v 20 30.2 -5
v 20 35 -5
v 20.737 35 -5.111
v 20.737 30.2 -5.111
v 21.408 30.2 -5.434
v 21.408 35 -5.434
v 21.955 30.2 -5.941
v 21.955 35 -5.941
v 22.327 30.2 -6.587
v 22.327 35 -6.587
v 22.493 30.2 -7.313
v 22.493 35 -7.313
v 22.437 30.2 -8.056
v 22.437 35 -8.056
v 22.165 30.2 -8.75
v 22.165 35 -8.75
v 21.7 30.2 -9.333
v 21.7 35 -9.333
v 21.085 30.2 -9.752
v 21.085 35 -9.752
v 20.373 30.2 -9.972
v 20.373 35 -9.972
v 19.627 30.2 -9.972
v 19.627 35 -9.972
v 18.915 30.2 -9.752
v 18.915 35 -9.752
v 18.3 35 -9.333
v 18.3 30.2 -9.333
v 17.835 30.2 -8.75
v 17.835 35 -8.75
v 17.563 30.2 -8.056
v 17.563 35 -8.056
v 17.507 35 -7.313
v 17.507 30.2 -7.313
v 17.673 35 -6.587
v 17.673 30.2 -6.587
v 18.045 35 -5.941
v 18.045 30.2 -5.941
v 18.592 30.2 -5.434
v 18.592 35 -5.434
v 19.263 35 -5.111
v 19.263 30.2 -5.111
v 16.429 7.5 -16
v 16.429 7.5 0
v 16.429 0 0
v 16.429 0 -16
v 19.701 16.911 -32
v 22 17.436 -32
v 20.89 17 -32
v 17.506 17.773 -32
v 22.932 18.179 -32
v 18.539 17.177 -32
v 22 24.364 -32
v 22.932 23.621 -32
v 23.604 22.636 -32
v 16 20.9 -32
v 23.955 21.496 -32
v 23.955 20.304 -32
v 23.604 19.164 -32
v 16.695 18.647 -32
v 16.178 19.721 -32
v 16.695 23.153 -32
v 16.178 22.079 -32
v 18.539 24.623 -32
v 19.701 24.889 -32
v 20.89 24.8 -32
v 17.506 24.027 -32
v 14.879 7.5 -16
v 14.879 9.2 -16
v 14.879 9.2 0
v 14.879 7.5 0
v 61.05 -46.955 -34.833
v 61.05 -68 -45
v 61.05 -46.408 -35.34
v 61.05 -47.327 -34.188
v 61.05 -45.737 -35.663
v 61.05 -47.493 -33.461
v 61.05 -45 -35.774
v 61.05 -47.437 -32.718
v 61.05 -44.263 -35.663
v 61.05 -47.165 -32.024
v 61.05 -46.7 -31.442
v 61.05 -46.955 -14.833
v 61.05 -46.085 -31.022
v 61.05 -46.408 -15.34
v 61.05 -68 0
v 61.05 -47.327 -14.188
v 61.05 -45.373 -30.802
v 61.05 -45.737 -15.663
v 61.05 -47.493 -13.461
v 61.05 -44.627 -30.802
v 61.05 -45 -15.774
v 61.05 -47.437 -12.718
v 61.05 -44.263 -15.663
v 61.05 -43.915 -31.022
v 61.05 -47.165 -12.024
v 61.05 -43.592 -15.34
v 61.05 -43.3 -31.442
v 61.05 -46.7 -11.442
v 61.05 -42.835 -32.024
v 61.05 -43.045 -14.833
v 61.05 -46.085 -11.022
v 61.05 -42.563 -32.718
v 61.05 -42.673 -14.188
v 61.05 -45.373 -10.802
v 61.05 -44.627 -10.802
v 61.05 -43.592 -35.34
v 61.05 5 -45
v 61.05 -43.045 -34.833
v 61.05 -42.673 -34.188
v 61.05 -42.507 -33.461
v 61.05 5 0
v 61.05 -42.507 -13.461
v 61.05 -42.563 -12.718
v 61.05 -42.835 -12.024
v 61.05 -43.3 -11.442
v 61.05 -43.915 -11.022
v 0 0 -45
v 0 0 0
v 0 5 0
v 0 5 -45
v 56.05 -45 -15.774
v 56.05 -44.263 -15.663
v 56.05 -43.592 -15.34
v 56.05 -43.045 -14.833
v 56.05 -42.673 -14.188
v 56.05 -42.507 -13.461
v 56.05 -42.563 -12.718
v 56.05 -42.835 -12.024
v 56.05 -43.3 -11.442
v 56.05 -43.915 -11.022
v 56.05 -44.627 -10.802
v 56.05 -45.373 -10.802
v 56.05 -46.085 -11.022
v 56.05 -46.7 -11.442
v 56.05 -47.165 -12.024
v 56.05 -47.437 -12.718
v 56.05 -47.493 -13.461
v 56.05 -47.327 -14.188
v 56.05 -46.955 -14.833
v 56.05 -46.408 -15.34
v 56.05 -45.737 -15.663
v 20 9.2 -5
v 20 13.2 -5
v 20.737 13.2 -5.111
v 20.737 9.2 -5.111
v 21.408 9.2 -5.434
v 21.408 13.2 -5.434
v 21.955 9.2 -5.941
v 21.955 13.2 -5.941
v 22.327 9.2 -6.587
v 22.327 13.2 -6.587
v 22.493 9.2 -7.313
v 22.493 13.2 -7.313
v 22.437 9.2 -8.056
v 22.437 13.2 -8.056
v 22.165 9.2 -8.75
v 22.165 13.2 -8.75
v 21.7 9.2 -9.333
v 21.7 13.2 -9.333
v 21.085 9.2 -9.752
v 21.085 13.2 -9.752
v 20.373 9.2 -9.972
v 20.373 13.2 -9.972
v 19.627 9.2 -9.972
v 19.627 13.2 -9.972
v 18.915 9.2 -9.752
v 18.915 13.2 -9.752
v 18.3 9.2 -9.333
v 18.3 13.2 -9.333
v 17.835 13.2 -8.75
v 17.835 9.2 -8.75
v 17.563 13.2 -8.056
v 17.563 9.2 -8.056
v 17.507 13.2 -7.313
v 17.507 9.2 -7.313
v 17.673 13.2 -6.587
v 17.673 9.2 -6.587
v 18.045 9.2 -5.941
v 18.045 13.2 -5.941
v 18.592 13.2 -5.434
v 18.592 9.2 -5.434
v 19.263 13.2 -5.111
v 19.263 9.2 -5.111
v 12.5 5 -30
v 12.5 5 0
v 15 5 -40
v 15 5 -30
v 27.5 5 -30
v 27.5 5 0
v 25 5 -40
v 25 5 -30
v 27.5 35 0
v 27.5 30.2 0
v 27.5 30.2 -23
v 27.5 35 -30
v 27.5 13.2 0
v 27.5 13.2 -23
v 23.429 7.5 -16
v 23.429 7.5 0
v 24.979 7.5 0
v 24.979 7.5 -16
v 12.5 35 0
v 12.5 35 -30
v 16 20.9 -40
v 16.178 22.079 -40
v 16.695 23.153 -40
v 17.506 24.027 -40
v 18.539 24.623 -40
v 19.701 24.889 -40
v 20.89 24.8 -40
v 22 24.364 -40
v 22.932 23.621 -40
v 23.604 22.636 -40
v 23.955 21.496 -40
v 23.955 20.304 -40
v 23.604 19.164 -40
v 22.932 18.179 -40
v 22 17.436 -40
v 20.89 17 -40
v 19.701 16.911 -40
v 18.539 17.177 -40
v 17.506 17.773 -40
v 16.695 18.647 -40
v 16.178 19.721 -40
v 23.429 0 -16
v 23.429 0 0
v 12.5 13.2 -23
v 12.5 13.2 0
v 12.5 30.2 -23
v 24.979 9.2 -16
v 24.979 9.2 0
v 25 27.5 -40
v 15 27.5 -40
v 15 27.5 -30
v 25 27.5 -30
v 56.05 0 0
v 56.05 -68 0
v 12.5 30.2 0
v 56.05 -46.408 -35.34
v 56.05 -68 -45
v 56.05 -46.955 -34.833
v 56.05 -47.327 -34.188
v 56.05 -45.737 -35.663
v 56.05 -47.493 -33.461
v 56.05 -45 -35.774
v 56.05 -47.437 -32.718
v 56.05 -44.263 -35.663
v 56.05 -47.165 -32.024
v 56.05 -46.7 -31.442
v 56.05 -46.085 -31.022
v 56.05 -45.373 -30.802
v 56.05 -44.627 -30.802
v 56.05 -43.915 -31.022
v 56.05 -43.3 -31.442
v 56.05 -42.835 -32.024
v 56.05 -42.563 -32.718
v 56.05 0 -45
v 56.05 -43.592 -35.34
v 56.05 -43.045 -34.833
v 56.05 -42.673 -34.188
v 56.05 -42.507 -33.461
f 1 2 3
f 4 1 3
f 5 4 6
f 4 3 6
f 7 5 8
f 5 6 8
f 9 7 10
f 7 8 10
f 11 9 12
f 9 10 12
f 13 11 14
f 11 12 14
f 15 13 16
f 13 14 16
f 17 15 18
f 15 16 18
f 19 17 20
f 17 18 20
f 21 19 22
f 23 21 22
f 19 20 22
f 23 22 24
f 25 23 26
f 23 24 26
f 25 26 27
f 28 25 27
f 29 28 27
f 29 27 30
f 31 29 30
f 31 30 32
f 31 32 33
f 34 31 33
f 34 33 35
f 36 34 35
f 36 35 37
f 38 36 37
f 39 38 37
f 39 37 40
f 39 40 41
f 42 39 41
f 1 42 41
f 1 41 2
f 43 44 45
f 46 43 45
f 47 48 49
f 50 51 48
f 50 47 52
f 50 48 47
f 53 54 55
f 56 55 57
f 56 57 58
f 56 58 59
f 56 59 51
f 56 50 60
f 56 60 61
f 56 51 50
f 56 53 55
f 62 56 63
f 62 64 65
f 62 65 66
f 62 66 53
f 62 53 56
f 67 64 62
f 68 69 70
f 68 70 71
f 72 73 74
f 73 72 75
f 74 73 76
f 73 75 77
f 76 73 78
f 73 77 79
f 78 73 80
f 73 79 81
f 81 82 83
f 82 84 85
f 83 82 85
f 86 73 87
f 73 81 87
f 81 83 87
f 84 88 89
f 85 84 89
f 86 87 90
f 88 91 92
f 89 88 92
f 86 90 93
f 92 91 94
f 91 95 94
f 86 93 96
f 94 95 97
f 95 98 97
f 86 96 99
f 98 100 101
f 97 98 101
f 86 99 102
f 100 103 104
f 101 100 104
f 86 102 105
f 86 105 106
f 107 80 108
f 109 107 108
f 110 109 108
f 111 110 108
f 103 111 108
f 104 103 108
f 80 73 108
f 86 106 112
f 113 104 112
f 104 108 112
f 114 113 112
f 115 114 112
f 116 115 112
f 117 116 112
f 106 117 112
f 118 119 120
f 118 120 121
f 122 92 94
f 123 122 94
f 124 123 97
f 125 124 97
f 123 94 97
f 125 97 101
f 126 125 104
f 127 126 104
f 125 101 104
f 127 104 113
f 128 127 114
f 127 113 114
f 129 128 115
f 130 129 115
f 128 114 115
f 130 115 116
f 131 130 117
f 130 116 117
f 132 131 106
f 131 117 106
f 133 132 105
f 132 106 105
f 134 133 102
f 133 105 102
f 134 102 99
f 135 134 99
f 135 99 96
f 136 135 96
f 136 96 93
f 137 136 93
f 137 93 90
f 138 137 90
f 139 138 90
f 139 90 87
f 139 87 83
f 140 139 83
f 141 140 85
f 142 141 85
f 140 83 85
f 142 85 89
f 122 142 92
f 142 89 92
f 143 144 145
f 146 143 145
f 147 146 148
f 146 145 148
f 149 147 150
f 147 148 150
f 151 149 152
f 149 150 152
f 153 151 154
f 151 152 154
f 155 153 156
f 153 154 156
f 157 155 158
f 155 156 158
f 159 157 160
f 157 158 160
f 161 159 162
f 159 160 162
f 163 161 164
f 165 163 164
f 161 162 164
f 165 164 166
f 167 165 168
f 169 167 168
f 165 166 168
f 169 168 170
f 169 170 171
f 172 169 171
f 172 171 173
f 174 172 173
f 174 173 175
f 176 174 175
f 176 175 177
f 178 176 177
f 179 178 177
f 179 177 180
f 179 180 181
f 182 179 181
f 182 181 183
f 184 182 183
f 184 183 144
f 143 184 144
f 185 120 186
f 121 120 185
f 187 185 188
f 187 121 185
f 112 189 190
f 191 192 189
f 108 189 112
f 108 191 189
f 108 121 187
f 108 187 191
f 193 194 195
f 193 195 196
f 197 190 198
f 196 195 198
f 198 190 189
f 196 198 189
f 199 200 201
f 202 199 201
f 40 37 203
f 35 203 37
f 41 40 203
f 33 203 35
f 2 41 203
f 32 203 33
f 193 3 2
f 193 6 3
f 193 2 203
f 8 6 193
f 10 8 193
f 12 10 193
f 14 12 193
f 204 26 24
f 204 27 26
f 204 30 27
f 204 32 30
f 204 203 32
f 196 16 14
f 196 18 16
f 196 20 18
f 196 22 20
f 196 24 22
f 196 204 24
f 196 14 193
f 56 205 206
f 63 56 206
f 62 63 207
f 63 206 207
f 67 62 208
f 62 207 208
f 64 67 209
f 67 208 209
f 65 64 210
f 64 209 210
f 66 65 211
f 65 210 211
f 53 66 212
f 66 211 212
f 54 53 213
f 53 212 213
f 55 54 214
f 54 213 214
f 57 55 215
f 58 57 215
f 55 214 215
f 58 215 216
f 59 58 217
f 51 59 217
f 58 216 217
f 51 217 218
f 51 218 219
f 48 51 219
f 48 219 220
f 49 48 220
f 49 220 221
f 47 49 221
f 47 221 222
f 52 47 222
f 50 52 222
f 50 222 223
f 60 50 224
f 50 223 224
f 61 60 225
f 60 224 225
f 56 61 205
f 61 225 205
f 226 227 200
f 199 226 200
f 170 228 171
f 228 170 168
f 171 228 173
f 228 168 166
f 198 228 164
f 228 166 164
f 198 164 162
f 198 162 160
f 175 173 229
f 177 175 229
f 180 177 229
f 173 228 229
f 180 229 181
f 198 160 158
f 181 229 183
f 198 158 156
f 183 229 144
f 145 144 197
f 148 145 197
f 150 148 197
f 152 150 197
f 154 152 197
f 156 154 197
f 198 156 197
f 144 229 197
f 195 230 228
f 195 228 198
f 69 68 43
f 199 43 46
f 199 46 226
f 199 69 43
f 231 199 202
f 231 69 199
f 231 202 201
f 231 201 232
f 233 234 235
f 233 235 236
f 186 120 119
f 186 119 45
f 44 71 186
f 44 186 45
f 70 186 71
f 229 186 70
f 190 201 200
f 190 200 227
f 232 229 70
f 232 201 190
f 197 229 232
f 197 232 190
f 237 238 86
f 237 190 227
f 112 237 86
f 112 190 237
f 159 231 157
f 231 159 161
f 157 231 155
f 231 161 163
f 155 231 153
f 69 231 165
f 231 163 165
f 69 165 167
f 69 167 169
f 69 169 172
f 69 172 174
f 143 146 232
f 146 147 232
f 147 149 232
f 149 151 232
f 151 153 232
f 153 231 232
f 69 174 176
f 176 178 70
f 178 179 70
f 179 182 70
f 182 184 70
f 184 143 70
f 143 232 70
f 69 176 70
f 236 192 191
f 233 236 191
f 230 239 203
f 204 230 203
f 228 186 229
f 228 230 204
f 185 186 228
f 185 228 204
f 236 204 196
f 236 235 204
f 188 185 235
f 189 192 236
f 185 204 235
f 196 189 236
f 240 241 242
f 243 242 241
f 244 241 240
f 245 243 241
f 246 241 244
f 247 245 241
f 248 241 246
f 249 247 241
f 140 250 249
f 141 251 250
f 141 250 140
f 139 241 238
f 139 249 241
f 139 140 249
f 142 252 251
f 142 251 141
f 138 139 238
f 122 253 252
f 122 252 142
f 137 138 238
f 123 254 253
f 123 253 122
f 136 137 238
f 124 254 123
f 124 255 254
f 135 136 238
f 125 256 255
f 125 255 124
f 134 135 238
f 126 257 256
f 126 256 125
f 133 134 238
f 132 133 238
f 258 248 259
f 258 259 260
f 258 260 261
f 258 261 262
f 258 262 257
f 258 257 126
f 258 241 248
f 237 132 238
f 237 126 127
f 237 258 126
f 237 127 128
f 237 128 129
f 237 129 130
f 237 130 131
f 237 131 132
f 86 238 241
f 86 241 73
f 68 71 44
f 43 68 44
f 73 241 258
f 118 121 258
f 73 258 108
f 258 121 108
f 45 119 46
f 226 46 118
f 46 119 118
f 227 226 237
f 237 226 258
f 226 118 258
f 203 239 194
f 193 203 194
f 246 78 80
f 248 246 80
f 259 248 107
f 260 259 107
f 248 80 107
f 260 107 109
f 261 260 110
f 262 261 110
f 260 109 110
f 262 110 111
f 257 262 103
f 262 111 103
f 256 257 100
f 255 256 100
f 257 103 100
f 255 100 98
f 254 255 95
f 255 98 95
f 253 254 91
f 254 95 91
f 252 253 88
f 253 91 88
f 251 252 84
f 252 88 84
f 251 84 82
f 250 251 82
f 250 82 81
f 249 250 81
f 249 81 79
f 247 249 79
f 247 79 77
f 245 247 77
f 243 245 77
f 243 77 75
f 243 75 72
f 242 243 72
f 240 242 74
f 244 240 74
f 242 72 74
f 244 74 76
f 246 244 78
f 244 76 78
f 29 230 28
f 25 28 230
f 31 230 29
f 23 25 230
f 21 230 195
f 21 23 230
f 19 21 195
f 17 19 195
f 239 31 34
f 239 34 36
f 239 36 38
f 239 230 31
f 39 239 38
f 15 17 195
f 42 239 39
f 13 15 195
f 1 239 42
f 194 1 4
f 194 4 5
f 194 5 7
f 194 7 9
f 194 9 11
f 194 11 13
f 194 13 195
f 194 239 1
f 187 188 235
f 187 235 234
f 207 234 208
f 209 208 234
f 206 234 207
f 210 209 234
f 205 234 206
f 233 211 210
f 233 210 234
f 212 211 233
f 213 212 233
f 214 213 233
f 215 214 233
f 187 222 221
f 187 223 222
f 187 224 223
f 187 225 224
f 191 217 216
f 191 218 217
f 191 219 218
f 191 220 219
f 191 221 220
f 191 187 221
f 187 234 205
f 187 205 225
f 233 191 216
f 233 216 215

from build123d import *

# Parameters (mm, degrees)
SKETCH1_W           = 61.05
SKETCH1_H           = 45
BOSS_EXTRUDE2_DEPTH = 5
SKETCH2_W           = 10
SKETCH2_H           = 10
BOSS_EXTRUDE3_DEPTH = 22.5
SKETCH3_R           = 4
CUT_EXTRUDE1_DEPTH  = 8
SKETCH6_W           = 15
SKETCH6_H           = 30
BOSS_EXTRUDE4_DEPTH = 30
SKETCH7_W           = 15
SKETCH7_H           = 17
CUT_EXTRUDE3_DEPTH  = 23
SKETCH8_R           = 2.5
CUT_EXTRUDE4_DEPTH  = 84.529051832
SKETCH9_W           = 5
SKETCH9_H           = 45
BOSS_EXTRUDE5_DEPTH = 68
SKETCH10_R          = 2.5
CUT_EXTRUDE5_DEPTH  = 5
CUT_EXTRUDE6_DEPTH  = 16


with BuildPart() as part:
    # Sketch1 → Boss-Extrude2 (new body)
    with BuildSketch(Plane(origin=(0, 0, 0), x_dir=(1, 0, 0), z_dir=(0, 1, 0))):
        with Locations((30.525, 22.5)):
            Rectangle(SKETCH1_W, SKETCH1_H)
    extrude(amount=BOSS_EXTRUDE2_DEPTH)

    # Sketch2 → Boss-Extrude3 (add)
    with BuildSketch(Plane(origin=(0, 5, 0), x_dir=(1, 0, 0), z_dir=(0, 1, 0))):
        with Locations((20, 35)):
            Rectangle(SKETCH2_W, SKETCH2_H)
    extrude(amount=BOSS_EXTRUDE3_DEPTH)

    # Sketch3 → Cut-Extrude1 (cut)
    with BuildSketch(Plane(origin=(0, 0, -40), x_dir=(-1, 0, 0), z_dir=(0, 0, -1))):
        with Locations((-20, 20.9)):
            Circle(SKETCH3_R)
    extrude(amount=-CUT_EXTRUDE1_DEPTH, mode=Mode.SUBTRACT)

    # Sketch6 → Boss-Extrude4 (add)
    with BuildSketch(Plane(origin=(0, 5, 0), x_dir=(1, 0, 0), z_dir=(0, 1, 0))):
        with Locations((20, 15)):
            Rectangle(SKETCH6_W, SKETCH6_H)
    extrude(amount=BOSS_EXTRUDE4_DEPTH)

    # Sketch7 → Cut-Extrude3 (cut)
    with BuildSketch(Plane.XY):
        with Locations((20, 21.7)):
            Rectangle(SKETCH7_W, SKETCH7_H)
    extrude(amount=-CUT_EXTRUDE3_DEPTH, mode=Mode.SUBTRACT)

    # Sketch8 → Cut-Extrude4 (cut, through all)
    with BuildSketch(Plane(origin=(0, 35, 0), x_dir=(1, 0, 0), z_dir=(0, 1, 0))):
        with Locations(Location((20, 7.5, 0), (0, 0, 270))):
            Circle(SKETCH8_R)
    extrude(amount=-CUT_EXTRUDE4_DEPTH, mode=Mode.SUBTRACT)

    # Sketch9 → Boss-Extrude5 (add)
    with BuildSketch(Plane.XZ):
        with Locations((58.55, -22.5)):
            Rectangle(SKETCH9_W, SKETCH9_H)
    extrude(amount=BOSS_EXTRUDE5_DEPTH)

    # Sketch10 → Cut-Extrude5 (cut)
    with BuildSketch(Plane(origin=(61.05, 0, 0), x_dir=(0, 0, -1), z_dir=(1, 0, 0))):
        with Locations((13.274189438, -45)):
            Circle(SKETCH10_R)
        with Locations((33.274189438, -45)):
            Circle(SKETCH10_R)
    extrude(amount=-CUT_EXTRUDE5_DEPTH, mode=Mode.SUBTRACT)

    # Sketch11 → Cut-Extrude6 (cut)
    with BuildSketch(Plane.XY):
        Polygon((24.979172019, 9.2), (14.879172019, 9.2), (14.879172019, 7.5), (16.429172019, 7.5), (16.429172019, -2.944116306), (23.429172019, -2.944116306), (23.429172019, 7.5), (24.979172019, 7.5), align=None)
    extrude(amount=-CUT_EXTRUDE6_DEPTH, mode=Mode.SUBTRACT)


solid = part.part
